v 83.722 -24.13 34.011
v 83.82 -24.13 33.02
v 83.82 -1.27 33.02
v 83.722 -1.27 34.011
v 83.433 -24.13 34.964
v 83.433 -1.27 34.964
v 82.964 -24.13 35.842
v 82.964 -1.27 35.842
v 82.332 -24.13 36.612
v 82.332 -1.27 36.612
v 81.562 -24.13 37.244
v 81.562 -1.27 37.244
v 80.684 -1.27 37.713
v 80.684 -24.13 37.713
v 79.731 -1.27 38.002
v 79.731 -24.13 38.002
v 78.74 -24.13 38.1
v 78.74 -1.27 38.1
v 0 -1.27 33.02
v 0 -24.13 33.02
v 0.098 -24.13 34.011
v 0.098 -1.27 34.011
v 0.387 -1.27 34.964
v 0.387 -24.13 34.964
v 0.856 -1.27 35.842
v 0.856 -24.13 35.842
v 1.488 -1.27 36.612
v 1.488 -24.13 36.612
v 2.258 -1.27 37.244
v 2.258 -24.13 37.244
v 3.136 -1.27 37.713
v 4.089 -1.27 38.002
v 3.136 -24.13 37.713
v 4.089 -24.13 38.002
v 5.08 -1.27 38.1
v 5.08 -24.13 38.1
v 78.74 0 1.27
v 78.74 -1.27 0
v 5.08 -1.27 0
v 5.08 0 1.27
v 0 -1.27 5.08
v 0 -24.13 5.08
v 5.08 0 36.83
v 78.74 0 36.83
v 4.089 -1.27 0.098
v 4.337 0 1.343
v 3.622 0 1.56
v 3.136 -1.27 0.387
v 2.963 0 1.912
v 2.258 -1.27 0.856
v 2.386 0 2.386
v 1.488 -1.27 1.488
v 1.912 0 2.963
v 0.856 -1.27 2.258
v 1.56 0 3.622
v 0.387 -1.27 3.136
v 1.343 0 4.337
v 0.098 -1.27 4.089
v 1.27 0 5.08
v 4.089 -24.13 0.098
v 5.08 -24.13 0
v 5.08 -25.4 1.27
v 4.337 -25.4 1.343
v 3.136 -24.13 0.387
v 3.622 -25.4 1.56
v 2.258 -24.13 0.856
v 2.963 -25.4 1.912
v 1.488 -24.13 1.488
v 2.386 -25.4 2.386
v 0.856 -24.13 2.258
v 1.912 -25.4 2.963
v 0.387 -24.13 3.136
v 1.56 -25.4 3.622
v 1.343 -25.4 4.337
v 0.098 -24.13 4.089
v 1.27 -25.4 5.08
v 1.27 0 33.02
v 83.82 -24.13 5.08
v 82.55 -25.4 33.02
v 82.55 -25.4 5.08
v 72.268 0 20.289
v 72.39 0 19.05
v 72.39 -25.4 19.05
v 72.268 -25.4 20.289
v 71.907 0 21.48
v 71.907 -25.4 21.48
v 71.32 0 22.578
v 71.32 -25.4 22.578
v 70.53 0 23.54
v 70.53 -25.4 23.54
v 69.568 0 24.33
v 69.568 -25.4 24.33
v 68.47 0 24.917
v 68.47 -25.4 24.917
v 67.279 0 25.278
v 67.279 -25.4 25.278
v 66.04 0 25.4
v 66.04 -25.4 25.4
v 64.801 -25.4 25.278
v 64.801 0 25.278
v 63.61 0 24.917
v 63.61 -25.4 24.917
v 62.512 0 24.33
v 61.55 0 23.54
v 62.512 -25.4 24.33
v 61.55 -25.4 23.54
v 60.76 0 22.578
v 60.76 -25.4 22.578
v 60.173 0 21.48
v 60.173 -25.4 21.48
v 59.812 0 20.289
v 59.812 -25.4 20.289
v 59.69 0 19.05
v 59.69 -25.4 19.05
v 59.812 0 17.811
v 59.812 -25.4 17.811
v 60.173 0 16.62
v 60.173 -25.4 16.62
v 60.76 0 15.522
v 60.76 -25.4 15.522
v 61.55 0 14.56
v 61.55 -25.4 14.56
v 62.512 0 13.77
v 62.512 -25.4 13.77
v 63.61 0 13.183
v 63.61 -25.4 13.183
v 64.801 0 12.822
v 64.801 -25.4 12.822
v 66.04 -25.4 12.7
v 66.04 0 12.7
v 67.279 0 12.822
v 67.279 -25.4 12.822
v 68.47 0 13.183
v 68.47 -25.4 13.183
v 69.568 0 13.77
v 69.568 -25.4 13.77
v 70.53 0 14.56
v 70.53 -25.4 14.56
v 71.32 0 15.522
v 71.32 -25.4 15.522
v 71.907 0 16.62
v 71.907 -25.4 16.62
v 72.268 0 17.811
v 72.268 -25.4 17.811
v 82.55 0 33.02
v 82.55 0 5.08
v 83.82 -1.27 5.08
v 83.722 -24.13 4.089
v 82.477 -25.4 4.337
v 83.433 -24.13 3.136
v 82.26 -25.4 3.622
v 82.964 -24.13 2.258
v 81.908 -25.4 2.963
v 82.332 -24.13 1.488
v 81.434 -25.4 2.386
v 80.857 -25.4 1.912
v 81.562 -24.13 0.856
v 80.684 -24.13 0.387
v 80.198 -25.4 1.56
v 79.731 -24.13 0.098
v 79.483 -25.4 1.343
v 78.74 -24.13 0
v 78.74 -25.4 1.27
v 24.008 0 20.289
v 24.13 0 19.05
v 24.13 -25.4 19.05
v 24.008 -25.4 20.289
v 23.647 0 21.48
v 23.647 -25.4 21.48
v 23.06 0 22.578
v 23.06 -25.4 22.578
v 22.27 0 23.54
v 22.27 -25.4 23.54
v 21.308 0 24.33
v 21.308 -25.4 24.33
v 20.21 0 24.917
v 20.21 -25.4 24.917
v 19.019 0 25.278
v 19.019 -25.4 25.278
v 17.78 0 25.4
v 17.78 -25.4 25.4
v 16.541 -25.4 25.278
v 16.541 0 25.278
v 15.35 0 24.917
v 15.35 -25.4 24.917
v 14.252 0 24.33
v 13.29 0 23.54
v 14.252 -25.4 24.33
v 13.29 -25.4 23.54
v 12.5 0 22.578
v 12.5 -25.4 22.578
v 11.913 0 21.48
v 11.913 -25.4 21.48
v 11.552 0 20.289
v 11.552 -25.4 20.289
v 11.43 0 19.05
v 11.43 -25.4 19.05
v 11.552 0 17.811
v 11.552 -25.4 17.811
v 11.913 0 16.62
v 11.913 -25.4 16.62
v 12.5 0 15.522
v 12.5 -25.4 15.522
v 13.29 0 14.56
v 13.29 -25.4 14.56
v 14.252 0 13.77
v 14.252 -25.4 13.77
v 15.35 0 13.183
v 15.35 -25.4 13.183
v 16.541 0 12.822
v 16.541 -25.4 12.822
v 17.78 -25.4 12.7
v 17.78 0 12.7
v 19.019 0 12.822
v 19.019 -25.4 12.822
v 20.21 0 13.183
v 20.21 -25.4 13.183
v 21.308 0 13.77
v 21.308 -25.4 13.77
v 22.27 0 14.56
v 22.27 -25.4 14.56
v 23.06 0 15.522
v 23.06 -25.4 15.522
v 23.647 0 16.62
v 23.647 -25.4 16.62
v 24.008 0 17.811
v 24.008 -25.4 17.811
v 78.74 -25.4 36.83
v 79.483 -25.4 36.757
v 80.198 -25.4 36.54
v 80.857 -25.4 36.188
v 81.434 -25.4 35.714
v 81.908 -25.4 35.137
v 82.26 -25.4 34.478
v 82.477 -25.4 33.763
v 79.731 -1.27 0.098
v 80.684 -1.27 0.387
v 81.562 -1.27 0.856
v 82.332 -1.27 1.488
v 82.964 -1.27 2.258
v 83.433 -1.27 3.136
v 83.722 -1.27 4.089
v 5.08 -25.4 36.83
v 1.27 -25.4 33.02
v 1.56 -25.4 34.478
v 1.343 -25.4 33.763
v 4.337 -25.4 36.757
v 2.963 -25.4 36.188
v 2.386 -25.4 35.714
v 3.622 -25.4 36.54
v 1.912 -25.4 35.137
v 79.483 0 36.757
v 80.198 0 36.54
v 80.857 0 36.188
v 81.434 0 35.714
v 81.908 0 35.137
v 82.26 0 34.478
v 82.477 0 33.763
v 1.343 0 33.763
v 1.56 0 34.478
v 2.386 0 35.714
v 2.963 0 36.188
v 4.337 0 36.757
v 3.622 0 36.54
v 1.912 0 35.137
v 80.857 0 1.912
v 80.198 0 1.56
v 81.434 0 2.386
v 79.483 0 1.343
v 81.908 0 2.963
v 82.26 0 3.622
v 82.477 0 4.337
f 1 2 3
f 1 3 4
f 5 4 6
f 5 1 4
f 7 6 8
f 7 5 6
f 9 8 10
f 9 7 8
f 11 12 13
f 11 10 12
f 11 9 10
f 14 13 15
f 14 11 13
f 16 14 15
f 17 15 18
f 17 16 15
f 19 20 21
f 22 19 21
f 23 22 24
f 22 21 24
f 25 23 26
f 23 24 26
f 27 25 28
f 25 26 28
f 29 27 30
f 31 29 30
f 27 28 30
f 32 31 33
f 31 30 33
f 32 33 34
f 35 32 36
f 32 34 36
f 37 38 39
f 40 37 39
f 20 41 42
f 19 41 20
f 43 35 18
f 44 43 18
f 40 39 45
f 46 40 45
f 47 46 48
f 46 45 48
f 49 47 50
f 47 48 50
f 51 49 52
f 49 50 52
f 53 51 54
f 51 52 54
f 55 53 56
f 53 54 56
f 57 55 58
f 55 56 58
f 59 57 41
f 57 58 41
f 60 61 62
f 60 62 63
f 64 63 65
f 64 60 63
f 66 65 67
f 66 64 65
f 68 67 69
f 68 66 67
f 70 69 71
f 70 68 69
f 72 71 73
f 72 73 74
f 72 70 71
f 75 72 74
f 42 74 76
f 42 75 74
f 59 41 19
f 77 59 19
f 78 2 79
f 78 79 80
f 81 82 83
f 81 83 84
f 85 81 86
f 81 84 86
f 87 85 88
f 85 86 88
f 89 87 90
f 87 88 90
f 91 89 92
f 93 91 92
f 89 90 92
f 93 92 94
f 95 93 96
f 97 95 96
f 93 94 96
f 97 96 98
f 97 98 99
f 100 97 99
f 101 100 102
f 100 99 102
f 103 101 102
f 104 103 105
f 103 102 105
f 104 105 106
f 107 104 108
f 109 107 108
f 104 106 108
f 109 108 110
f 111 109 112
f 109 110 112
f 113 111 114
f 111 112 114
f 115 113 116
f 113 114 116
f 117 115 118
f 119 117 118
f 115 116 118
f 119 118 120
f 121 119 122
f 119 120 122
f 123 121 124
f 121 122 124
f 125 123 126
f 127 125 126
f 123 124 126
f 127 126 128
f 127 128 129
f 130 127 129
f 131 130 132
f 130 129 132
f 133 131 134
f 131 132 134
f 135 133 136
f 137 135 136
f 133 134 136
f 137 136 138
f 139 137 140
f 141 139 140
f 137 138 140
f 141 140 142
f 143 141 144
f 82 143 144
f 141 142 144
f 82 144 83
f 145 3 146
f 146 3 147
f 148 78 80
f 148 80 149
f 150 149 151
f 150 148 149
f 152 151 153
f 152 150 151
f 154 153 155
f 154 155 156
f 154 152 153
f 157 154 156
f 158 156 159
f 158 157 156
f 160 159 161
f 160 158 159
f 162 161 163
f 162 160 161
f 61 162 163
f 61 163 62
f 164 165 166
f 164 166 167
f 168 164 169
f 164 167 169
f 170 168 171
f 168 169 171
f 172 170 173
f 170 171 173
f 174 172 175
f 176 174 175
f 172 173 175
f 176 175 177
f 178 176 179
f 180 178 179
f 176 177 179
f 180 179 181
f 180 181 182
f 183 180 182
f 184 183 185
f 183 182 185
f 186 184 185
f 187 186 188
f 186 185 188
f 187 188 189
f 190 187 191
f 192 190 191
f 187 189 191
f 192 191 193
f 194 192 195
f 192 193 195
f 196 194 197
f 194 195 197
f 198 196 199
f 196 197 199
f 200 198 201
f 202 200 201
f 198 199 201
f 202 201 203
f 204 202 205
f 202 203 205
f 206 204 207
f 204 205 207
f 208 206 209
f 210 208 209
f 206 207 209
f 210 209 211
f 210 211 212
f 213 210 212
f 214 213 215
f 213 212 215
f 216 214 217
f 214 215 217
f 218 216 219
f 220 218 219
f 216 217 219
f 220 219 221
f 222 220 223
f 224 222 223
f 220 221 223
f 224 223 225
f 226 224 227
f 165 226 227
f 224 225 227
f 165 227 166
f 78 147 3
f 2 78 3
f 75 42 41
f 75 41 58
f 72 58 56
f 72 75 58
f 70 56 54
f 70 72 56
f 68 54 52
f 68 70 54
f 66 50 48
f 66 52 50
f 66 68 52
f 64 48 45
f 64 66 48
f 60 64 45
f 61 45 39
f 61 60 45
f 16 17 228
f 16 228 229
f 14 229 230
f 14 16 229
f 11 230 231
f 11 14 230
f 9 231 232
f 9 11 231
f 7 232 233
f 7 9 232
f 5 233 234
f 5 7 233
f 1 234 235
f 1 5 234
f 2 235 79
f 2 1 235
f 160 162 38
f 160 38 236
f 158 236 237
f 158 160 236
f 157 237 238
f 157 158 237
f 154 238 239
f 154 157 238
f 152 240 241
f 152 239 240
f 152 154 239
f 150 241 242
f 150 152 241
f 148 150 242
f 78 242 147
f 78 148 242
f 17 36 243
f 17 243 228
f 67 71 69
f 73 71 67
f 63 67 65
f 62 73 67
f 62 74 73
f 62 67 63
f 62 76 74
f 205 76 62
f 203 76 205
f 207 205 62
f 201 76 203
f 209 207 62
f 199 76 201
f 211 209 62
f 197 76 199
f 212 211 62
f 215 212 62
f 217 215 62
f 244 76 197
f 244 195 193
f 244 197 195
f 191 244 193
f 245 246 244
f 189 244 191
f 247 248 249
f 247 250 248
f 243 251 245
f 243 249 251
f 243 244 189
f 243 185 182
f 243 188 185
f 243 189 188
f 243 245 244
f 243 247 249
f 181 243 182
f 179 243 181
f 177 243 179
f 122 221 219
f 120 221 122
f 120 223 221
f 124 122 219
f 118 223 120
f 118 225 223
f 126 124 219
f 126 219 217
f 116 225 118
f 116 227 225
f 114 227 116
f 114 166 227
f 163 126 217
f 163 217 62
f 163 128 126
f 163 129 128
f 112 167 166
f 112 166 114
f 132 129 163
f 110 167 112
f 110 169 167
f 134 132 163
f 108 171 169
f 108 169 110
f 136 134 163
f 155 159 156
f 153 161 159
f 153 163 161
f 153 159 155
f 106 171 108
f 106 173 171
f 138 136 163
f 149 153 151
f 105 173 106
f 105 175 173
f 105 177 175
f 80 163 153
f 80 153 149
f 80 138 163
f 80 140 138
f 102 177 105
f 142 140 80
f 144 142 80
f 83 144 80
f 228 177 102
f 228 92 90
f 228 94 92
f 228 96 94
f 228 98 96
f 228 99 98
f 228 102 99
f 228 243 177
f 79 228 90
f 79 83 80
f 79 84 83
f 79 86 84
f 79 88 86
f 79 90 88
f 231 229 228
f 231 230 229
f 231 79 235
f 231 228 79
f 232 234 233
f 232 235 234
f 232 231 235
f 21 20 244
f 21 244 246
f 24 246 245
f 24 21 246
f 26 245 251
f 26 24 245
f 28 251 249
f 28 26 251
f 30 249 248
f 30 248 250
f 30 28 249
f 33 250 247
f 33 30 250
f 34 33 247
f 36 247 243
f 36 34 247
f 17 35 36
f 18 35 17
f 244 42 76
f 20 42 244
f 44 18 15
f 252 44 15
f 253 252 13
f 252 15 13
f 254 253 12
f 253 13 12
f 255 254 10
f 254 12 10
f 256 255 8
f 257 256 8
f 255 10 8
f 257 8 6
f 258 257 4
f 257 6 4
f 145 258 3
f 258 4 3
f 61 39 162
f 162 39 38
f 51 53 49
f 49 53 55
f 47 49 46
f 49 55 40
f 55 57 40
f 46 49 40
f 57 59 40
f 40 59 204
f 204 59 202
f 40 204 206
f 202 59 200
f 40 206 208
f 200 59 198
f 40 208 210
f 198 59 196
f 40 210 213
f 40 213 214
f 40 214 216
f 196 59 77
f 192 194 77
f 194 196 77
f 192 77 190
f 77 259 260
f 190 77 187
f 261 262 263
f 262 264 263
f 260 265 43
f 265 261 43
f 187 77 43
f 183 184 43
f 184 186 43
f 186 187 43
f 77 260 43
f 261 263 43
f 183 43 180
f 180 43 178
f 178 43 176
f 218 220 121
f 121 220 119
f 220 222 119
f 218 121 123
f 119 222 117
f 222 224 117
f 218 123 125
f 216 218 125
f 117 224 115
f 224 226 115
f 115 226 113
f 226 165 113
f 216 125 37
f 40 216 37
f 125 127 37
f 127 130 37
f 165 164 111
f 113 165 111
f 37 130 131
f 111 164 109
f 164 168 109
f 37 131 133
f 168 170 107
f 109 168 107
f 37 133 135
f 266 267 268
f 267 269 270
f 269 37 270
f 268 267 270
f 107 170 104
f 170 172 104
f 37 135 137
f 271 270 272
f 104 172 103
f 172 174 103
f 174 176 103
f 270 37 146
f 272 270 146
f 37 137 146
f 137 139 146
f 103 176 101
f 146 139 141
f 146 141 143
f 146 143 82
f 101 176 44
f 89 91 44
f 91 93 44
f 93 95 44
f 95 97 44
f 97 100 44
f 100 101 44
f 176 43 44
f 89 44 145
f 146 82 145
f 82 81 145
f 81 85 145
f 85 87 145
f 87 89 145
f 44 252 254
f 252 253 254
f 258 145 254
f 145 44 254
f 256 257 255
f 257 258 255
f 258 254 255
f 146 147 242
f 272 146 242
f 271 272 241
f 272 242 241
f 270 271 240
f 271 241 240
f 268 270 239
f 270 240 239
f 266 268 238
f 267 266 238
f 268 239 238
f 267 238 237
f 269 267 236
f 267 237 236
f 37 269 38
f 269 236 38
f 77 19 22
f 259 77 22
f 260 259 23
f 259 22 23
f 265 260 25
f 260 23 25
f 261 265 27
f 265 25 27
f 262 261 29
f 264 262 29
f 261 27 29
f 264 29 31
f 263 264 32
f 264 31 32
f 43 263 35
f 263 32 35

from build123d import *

# Parameters (mm, degrees)
F0_W     = 83.82
F0_H     = 38.1
F1_DEPTH = 25.4
F2_R     = 5.08
F3_R     = 6.35
F4_DEPTH = 25.4
F5_SIZE  = 1.27


with BuildPart() as f1:
    # F0 (on Front) → F1 (new body)
    with BuildSketch(Plane.XZ):
        with Locations((41.91, 19.05)):
            Rectangle(F0_W, F0_H)
    extrude(amount=F1_DEPTH)

    # F2
    f2_edges = [f1.edges().sort_by_distance(p)[0] for p in [
        (83.82, -12.7, 38.1),
        (0, -12.7, 38.1),
        (83.82, -12.7, 0),
        (0, -12.7, 0),
    ]]
    fillet(f2_edges, radius=F2_R)

    # F3 (on face) → F4 (cut, through all)
    with BuildSketch(Plane.XZ.offset(25.4)):
        with Locations((17.78, 19.05)):
            Circle(F3_R)
        with Locations((66.04, 19.05)):
            Circle(F3_R)
    extrude(amount=-F4_DEPTH, mode=Mode.SUBTRACT)

    # F5
    f5_edges = [f1.edges().sort_by_distance(p)[0] for p in [
        (41.91, -25.4, 38.1),
        (41.91, 0, 38.1),
    ]]
    chamfer(f5_edges, length=F5_SIZE)


solid = f1.part
